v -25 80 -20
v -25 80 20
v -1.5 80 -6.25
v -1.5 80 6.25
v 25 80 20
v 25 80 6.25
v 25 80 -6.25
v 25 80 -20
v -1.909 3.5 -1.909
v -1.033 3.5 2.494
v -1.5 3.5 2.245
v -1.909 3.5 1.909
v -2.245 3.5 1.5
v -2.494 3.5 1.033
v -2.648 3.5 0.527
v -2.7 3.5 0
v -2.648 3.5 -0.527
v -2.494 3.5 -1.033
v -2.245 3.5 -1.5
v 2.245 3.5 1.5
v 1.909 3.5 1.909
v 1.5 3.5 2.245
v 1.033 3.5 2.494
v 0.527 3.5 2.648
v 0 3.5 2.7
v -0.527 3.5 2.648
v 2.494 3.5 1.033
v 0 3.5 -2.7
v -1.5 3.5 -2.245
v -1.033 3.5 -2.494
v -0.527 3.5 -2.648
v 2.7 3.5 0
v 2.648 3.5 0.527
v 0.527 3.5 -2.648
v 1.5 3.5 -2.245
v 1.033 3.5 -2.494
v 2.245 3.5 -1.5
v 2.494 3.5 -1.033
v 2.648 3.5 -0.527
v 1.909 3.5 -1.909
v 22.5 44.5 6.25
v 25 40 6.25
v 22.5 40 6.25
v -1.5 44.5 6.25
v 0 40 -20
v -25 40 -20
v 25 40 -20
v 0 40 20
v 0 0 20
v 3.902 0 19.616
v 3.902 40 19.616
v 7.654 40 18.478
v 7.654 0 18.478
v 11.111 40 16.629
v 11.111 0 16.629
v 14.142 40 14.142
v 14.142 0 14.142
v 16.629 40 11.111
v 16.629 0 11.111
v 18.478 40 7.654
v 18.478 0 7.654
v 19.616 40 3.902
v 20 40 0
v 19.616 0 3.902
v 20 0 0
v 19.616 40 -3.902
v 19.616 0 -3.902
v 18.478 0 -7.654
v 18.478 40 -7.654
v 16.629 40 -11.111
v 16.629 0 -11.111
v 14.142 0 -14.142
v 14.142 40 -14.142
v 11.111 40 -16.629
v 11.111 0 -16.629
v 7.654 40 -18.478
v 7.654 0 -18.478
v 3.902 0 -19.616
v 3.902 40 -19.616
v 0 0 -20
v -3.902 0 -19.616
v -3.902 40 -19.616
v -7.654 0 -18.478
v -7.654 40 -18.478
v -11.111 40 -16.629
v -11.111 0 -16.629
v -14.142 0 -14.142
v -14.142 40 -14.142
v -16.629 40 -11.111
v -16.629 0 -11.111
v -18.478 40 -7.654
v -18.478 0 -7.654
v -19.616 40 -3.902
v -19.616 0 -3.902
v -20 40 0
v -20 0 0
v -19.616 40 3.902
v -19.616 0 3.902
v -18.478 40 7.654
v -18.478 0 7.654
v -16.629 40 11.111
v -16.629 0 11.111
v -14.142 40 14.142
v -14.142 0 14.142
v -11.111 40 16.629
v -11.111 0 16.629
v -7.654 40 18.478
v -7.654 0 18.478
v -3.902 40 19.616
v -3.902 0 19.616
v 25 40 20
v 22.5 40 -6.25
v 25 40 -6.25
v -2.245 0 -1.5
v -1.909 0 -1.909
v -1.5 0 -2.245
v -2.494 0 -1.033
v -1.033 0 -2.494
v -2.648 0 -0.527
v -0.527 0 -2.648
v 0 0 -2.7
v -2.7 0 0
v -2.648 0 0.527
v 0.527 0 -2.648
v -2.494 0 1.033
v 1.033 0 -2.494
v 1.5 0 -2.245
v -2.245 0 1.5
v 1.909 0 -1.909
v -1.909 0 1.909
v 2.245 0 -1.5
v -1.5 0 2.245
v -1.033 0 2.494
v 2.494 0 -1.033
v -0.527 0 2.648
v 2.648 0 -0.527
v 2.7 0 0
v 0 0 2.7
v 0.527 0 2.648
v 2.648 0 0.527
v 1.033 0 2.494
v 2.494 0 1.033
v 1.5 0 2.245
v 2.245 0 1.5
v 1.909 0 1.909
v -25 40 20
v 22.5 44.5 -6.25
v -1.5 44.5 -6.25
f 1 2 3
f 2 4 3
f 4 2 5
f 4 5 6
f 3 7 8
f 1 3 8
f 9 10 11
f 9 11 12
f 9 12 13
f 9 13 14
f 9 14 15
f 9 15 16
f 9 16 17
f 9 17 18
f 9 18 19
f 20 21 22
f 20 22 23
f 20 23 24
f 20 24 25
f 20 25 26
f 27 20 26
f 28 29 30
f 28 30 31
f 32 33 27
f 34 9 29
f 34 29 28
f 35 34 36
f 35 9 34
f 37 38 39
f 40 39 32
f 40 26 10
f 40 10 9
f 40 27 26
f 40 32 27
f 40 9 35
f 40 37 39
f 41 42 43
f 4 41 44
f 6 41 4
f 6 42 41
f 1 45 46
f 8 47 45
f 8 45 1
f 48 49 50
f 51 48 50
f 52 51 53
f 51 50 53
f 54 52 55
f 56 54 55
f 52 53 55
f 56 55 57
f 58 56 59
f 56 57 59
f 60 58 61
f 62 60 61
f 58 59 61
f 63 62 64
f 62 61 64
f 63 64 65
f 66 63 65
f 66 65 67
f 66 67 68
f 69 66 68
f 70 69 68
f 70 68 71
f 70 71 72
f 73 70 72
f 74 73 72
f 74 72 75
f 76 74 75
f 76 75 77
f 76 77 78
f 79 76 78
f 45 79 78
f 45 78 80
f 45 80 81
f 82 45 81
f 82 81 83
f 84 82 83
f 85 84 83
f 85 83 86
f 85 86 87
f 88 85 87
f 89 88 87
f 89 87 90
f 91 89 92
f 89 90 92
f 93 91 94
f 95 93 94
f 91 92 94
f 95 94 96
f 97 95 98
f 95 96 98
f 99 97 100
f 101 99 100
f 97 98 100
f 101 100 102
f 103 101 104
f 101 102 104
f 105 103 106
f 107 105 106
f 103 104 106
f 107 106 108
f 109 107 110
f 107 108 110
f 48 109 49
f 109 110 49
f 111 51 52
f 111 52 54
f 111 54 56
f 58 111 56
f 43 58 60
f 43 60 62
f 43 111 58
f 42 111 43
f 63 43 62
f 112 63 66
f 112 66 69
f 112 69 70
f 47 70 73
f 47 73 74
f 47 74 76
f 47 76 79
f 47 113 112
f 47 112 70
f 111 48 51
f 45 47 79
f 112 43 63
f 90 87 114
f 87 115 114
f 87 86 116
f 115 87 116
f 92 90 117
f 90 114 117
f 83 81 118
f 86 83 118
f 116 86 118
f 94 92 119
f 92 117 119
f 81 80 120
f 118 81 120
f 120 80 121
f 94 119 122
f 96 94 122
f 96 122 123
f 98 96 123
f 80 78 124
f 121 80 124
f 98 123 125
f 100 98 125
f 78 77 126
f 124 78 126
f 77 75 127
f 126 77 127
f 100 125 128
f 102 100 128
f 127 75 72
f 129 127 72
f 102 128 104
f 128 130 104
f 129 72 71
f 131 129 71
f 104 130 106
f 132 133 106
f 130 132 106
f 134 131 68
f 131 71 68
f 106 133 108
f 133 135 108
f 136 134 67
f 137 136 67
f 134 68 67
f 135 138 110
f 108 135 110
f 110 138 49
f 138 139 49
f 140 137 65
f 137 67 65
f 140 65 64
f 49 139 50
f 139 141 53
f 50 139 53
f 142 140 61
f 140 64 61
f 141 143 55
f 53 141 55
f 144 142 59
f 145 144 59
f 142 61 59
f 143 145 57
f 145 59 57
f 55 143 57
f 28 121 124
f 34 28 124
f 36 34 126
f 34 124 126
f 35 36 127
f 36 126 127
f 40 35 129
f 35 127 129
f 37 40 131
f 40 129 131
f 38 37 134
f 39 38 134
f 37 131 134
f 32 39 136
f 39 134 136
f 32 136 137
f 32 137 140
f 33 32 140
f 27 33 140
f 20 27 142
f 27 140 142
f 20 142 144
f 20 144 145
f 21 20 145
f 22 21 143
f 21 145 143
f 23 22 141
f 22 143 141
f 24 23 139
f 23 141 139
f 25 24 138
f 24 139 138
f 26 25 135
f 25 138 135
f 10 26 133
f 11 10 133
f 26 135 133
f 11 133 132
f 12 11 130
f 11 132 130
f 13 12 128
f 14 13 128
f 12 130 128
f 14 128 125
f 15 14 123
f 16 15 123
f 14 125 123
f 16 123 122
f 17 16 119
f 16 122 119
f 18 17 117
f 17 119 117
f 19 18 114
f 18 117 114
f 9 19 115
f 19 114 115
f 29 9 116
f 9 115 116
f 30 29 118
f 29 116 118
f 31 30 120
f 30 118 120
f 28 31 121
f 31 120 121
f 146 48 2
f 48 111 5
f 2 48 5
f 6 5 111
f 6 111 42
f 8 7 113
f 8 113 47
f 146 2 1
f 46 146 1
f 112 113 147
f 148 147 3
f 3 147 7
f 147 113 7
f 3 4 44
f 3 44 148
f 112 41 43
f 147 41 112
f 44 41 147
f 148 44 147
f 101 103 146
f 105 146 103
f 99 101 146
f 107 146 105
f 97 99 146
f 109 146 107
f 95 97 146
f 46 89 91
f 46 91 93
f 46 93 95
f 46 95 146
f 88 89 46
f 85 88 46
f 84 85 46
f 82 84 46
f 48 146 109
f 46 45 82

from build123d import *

# Parameters (mm, degrees)
SKETCH1_R           = 20
BOSS_EXTRUDE1_DEPTH = 40
SKETCH2_R           = 2.7
CUT_EXTRUDE1_DEPTH  = 3.5
SKETCH3_W           = 40
SKETCH3_H           = 40
BOSS_EXTRUDE2_DEPTH = 25
SKETCH4_W           = 12.5
SKETCH4_H           = 40
CUT_EXTRUDE2_DEPTH  = 2.5
SKETCH5_W           = 12.5
SKETCH5_H           = 35.5
CUT_EXTRUDE3_DEPTH  = 24


with BuildPart() as part:
    # Sketch1 → Boss-Extrude1 (new body)
    with BuildSketch(Plane(origin=(0, 0, 0), x_dir=(1, 0, 0), z_dir=(0, 1, 0))):
        with Locations(Location((0, 0, 0), (0, 0, 270))):
            Circle(SKETCH1_R)
    extrude(amount=BOSS_EXTRUDE1_DEPTH)

    # Sketch2 → Cut-Extrude1 (cut)
    with BuildSketch(Plane.XZ):
        with Locations(Location((0, 0, 0), (0, 0, 270))):
            Circle(SKETCH2_R)
    extrude(amount=-CUT_EXTRUDE1_DEPTH, mode=Mode.SUBTRACT)

    # Sketch3 → Boss-Extrude2 (add, symmetric)
    with BuildSketch(Plane(origin=(0, 0, 0), x_dir=(0, 0, -1), z_dir=(1, 0, 0))):
        with Locations((0, 60)):
            Rectangle(SKETCH3_W, SKETCH3_H)
    extrude(amount=BOSS_EXTRUDE2_DEPTH, both=True)

    # Sketch4 → Cut-Extrude2 (cut)
    with BuildSketch(Plane(origin=(25, 0, 0), x_dir=(0, 0, -1), z_dir=(1, 0, 0))):
        with Locations((0, 60)):
            Rectangle(SKETCH4_W, SKETCH4_H)
    extrude(amount=-CUT_EXTRUDE2_DEPTH, mode=Mode.SUBTRACT)

    # Sketch5 → Cut-Extrude3 (cut)
    with BuildSketch(Plane(origin=(22.5, 0, 0), x_dir=(0, 0, -1), z_dir=(1, 0, 0))):
        with Locations((0, 62.25)):
            Rectangle(SKETCH5_W, SKETCH5_H)
    extrude(amount=-CUT_EXTRUDE3_DEPTH, mode=Mode.SUBTRACT)


solid = part.part
